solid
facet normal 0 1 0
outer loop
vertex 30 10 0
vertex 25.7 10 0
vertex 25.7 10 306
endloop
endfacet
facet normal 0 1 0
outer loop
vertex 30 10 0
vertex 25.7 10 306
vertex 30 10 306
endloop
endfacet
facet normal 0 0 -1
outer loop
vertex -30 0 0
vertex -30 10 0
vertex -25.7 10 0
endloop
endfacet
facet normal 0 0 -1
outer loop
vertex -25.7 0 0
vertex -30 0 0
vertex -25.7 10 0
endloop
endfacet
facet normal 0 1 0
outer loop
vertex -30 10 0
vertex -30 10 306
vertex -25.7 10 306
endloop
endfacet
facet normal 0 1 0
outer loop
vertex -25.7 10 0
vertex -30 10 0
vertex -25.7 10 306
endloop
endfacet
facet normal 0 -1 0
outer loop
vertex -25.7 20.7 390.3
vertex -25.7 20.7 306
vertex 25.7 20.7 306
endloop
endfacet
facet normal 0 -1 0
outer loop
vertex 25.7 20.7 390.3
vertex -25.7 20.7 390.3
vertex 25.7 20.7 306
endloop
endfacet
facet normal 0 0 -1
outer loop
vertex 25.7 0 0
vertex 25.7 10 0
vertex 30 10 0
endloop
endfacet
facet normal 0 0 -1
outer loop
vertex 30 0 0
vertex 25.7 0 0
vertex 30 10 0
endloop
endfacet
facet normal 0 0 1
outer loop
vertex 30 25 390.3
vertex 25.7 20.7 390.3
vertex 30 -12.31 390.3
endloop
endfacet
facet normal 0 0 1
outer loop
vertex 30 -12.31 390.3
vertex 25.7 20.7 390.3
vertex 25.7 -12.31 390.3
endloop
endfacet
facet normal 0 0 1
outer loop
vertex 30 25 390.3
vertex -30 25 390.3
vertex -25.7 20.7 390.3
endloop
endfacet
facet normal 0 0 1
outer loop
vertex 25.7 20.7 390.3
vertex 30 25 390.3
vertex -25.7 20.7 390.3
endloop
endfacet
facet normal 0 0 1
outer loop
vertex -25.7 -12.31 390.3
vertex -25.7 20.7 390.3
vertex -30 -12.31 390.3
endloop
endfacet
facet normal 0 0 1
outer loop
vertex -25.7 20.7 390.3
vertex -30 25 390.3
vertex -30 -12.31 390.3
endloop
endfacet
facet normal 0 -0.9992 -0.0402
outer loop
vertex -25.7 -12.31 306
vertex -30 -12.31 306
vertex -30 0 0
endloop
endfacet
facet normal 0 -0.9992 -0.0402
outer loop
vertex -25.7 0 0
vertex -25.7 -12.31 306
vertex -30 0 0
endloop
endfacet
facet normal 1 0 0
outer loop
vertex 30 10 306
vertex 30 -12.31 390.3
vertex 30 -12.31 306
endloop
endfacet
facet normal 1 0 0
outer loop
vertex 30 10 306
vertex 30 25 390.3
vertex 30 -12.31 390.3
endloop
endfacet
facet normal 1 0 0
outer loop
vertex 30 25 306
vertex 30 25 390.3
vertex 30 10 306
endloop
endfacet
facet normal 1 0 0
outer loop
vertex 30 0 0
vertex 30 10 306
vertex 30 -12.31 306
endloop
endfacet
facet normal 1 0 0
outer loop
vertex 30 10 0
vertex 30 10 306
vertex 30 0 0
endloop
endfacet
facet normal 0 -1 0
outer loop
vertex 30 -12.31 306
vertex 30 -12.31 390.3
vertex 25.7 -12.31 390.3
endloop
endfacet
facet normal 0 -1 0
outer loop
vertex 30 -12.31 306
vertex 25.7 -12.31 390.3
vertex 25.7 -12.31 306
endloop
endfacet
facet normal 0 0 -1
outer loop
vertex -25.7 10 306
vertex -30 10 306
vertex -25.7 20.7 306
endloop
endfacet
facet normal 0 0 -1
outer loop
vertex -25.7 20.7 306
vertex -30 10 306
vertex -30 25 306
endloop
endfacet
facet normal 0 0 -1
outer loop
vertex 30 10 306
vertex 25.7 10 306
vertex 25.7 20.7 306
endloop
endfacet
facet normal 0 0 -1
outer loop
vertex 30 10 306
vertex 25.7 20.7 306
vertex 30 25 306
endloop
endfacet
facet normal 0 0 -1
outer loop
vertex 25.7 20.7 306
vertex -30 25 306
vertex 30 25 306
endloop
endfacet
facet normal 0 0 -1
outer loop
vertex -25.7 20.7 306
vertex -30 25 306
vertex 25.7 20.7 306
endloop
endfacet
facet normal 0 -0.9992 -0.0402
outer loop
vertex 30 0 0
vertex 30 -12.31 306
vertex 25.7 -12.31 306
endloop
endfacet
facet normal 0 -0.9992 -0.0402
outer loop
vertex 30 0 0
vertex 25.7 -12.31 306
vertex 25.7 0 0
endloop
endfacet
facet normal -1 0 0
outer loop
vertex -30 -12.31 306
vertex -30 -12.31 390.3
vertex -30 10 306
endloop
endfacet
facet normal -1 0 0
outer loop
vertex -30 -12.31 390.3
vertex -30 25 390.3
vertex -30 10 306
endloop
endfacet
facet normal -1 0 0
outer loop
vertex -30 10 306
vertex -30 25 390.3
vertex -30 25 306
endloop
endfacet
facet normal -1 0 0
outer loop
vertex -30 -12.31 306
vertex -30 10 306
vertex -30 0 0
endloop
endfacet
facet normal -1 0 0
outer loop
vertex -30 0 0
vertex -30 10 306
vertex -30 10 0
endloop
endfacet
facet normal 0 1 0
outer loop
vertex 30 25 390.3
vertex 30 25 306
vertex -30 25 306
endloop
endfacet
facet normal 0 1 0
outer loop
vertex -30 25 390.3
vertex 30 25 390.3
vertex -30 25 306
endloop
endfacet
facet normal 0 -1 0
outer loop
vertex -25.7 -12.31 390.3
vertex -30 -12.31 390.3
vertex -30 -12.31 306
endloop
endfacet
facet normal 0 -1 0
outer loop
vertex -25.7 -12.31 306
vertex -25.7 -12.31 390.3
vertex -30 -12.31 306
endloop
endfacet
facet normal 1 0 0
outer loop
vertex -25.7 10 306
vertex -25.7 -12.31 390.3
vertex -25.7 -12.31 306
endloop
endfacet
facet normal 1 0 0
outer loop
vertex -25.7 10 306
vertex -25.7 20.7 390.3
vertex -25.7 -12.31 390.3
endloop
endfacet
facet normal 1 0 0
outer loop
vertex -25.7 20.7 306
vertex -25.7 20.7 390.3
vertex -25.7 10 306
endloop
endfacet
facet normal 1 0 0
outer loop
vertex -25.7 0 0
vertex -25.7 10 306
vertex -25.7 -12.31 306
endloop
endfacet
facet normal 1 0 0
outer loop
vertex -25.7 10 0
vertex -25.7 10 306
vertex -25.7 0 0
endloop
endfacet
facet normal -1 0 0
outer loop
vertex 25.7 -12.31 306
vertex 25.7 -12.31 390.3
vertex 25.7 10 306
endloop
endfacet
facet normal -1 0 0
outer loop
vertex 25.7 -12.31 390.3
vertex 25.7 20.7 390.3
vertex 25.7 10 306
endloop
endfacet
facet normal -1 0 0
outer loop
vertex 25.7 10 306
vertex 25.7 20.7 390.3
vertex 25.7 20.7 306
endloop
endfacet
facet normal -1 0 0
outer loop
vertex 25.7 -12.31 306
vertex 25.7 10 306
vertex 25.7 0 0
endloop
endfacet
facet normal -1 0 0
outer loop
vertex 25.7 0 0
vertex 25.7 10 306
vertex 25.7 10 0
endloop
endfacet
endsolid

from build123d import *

# Parameters (mm, degrees)
BOSS_EXTRUDE1_DEPTH = 390.3
BOSS_EXTRUDE2_DEPTH = 4.3
SKETCH3_W           = 8.6
SKETCH3_H           = 70
CUT_EXTRUDE1_DEPTH  = 10
SKETCH4_W           = 230.803227125
SKETCH4_H           = 349.257793427
CUT_EXTRUDE2_DEPTH  = 15


with BuildPart() as part:
    # Sketch1 → Boss-Extrude1 (new body)
    with BuildSketch(Plane.XY):
        Polygon((-30, 0), (-25.7, 0), (-25.7, 20.7), (25.7, 20.7), (25.7, 0), (30, 0), (30, 25), (-30, 25), align=None)
    extrude(amount=BOSS_EXTRUDE1_DEPTH)

    # Sketch2 → Boss-Extrude2 (add)
    with BuildSketch(Plane(origin=(30, 0, 0), x_dir=(0, 0, -1), z_dir=(1, 0, 0))):
        Polygon((-306, -12.31), (0, 0), (-390.3, 0), (-390.3, -12.31), align=None)
    boss_extrude2 = extrude(amount=-BOSS_EXTRUDE2_DEPTH)

    # Mirror1: Boss-Extrude2 across plane
    add(boss_extrude2.mirror(Plane(origin=(0, 0, 0), x_dir=(0, 0, 1), z_dir=(1, 0, 0))))

    # Sketch3 → Cut-Extrude1 (cut)
    with BuildSketch(Plane(origin=(0, 25, 0), x_dir=(1, 0, 0), z_dir=(0, 1, 0))):
        with Locations((0, -35)):
            Rectangle(SKETCH3_W, SKETCH3_H)
    extrude(amount=-CUT_EXTRUDE1_DEPTH, mode=Mode.SUBTRACT)

    # Sketch4 → Cut-Extrude2 (cut)
    with BuildSketch(Plane(origin=(0, 25, 0), x_dir=(1, 0, 0), z_dir=(0, 1, 0))):
        with Locations((42.992725749, -131.371103286)):
            Rectangle(SKETCH4_W, SKETCH4_H)
    extrude(amount=-CUT_EXTRUDE2_DEPTH, mode=Mode.SUBTRACT)


solid = part.part
